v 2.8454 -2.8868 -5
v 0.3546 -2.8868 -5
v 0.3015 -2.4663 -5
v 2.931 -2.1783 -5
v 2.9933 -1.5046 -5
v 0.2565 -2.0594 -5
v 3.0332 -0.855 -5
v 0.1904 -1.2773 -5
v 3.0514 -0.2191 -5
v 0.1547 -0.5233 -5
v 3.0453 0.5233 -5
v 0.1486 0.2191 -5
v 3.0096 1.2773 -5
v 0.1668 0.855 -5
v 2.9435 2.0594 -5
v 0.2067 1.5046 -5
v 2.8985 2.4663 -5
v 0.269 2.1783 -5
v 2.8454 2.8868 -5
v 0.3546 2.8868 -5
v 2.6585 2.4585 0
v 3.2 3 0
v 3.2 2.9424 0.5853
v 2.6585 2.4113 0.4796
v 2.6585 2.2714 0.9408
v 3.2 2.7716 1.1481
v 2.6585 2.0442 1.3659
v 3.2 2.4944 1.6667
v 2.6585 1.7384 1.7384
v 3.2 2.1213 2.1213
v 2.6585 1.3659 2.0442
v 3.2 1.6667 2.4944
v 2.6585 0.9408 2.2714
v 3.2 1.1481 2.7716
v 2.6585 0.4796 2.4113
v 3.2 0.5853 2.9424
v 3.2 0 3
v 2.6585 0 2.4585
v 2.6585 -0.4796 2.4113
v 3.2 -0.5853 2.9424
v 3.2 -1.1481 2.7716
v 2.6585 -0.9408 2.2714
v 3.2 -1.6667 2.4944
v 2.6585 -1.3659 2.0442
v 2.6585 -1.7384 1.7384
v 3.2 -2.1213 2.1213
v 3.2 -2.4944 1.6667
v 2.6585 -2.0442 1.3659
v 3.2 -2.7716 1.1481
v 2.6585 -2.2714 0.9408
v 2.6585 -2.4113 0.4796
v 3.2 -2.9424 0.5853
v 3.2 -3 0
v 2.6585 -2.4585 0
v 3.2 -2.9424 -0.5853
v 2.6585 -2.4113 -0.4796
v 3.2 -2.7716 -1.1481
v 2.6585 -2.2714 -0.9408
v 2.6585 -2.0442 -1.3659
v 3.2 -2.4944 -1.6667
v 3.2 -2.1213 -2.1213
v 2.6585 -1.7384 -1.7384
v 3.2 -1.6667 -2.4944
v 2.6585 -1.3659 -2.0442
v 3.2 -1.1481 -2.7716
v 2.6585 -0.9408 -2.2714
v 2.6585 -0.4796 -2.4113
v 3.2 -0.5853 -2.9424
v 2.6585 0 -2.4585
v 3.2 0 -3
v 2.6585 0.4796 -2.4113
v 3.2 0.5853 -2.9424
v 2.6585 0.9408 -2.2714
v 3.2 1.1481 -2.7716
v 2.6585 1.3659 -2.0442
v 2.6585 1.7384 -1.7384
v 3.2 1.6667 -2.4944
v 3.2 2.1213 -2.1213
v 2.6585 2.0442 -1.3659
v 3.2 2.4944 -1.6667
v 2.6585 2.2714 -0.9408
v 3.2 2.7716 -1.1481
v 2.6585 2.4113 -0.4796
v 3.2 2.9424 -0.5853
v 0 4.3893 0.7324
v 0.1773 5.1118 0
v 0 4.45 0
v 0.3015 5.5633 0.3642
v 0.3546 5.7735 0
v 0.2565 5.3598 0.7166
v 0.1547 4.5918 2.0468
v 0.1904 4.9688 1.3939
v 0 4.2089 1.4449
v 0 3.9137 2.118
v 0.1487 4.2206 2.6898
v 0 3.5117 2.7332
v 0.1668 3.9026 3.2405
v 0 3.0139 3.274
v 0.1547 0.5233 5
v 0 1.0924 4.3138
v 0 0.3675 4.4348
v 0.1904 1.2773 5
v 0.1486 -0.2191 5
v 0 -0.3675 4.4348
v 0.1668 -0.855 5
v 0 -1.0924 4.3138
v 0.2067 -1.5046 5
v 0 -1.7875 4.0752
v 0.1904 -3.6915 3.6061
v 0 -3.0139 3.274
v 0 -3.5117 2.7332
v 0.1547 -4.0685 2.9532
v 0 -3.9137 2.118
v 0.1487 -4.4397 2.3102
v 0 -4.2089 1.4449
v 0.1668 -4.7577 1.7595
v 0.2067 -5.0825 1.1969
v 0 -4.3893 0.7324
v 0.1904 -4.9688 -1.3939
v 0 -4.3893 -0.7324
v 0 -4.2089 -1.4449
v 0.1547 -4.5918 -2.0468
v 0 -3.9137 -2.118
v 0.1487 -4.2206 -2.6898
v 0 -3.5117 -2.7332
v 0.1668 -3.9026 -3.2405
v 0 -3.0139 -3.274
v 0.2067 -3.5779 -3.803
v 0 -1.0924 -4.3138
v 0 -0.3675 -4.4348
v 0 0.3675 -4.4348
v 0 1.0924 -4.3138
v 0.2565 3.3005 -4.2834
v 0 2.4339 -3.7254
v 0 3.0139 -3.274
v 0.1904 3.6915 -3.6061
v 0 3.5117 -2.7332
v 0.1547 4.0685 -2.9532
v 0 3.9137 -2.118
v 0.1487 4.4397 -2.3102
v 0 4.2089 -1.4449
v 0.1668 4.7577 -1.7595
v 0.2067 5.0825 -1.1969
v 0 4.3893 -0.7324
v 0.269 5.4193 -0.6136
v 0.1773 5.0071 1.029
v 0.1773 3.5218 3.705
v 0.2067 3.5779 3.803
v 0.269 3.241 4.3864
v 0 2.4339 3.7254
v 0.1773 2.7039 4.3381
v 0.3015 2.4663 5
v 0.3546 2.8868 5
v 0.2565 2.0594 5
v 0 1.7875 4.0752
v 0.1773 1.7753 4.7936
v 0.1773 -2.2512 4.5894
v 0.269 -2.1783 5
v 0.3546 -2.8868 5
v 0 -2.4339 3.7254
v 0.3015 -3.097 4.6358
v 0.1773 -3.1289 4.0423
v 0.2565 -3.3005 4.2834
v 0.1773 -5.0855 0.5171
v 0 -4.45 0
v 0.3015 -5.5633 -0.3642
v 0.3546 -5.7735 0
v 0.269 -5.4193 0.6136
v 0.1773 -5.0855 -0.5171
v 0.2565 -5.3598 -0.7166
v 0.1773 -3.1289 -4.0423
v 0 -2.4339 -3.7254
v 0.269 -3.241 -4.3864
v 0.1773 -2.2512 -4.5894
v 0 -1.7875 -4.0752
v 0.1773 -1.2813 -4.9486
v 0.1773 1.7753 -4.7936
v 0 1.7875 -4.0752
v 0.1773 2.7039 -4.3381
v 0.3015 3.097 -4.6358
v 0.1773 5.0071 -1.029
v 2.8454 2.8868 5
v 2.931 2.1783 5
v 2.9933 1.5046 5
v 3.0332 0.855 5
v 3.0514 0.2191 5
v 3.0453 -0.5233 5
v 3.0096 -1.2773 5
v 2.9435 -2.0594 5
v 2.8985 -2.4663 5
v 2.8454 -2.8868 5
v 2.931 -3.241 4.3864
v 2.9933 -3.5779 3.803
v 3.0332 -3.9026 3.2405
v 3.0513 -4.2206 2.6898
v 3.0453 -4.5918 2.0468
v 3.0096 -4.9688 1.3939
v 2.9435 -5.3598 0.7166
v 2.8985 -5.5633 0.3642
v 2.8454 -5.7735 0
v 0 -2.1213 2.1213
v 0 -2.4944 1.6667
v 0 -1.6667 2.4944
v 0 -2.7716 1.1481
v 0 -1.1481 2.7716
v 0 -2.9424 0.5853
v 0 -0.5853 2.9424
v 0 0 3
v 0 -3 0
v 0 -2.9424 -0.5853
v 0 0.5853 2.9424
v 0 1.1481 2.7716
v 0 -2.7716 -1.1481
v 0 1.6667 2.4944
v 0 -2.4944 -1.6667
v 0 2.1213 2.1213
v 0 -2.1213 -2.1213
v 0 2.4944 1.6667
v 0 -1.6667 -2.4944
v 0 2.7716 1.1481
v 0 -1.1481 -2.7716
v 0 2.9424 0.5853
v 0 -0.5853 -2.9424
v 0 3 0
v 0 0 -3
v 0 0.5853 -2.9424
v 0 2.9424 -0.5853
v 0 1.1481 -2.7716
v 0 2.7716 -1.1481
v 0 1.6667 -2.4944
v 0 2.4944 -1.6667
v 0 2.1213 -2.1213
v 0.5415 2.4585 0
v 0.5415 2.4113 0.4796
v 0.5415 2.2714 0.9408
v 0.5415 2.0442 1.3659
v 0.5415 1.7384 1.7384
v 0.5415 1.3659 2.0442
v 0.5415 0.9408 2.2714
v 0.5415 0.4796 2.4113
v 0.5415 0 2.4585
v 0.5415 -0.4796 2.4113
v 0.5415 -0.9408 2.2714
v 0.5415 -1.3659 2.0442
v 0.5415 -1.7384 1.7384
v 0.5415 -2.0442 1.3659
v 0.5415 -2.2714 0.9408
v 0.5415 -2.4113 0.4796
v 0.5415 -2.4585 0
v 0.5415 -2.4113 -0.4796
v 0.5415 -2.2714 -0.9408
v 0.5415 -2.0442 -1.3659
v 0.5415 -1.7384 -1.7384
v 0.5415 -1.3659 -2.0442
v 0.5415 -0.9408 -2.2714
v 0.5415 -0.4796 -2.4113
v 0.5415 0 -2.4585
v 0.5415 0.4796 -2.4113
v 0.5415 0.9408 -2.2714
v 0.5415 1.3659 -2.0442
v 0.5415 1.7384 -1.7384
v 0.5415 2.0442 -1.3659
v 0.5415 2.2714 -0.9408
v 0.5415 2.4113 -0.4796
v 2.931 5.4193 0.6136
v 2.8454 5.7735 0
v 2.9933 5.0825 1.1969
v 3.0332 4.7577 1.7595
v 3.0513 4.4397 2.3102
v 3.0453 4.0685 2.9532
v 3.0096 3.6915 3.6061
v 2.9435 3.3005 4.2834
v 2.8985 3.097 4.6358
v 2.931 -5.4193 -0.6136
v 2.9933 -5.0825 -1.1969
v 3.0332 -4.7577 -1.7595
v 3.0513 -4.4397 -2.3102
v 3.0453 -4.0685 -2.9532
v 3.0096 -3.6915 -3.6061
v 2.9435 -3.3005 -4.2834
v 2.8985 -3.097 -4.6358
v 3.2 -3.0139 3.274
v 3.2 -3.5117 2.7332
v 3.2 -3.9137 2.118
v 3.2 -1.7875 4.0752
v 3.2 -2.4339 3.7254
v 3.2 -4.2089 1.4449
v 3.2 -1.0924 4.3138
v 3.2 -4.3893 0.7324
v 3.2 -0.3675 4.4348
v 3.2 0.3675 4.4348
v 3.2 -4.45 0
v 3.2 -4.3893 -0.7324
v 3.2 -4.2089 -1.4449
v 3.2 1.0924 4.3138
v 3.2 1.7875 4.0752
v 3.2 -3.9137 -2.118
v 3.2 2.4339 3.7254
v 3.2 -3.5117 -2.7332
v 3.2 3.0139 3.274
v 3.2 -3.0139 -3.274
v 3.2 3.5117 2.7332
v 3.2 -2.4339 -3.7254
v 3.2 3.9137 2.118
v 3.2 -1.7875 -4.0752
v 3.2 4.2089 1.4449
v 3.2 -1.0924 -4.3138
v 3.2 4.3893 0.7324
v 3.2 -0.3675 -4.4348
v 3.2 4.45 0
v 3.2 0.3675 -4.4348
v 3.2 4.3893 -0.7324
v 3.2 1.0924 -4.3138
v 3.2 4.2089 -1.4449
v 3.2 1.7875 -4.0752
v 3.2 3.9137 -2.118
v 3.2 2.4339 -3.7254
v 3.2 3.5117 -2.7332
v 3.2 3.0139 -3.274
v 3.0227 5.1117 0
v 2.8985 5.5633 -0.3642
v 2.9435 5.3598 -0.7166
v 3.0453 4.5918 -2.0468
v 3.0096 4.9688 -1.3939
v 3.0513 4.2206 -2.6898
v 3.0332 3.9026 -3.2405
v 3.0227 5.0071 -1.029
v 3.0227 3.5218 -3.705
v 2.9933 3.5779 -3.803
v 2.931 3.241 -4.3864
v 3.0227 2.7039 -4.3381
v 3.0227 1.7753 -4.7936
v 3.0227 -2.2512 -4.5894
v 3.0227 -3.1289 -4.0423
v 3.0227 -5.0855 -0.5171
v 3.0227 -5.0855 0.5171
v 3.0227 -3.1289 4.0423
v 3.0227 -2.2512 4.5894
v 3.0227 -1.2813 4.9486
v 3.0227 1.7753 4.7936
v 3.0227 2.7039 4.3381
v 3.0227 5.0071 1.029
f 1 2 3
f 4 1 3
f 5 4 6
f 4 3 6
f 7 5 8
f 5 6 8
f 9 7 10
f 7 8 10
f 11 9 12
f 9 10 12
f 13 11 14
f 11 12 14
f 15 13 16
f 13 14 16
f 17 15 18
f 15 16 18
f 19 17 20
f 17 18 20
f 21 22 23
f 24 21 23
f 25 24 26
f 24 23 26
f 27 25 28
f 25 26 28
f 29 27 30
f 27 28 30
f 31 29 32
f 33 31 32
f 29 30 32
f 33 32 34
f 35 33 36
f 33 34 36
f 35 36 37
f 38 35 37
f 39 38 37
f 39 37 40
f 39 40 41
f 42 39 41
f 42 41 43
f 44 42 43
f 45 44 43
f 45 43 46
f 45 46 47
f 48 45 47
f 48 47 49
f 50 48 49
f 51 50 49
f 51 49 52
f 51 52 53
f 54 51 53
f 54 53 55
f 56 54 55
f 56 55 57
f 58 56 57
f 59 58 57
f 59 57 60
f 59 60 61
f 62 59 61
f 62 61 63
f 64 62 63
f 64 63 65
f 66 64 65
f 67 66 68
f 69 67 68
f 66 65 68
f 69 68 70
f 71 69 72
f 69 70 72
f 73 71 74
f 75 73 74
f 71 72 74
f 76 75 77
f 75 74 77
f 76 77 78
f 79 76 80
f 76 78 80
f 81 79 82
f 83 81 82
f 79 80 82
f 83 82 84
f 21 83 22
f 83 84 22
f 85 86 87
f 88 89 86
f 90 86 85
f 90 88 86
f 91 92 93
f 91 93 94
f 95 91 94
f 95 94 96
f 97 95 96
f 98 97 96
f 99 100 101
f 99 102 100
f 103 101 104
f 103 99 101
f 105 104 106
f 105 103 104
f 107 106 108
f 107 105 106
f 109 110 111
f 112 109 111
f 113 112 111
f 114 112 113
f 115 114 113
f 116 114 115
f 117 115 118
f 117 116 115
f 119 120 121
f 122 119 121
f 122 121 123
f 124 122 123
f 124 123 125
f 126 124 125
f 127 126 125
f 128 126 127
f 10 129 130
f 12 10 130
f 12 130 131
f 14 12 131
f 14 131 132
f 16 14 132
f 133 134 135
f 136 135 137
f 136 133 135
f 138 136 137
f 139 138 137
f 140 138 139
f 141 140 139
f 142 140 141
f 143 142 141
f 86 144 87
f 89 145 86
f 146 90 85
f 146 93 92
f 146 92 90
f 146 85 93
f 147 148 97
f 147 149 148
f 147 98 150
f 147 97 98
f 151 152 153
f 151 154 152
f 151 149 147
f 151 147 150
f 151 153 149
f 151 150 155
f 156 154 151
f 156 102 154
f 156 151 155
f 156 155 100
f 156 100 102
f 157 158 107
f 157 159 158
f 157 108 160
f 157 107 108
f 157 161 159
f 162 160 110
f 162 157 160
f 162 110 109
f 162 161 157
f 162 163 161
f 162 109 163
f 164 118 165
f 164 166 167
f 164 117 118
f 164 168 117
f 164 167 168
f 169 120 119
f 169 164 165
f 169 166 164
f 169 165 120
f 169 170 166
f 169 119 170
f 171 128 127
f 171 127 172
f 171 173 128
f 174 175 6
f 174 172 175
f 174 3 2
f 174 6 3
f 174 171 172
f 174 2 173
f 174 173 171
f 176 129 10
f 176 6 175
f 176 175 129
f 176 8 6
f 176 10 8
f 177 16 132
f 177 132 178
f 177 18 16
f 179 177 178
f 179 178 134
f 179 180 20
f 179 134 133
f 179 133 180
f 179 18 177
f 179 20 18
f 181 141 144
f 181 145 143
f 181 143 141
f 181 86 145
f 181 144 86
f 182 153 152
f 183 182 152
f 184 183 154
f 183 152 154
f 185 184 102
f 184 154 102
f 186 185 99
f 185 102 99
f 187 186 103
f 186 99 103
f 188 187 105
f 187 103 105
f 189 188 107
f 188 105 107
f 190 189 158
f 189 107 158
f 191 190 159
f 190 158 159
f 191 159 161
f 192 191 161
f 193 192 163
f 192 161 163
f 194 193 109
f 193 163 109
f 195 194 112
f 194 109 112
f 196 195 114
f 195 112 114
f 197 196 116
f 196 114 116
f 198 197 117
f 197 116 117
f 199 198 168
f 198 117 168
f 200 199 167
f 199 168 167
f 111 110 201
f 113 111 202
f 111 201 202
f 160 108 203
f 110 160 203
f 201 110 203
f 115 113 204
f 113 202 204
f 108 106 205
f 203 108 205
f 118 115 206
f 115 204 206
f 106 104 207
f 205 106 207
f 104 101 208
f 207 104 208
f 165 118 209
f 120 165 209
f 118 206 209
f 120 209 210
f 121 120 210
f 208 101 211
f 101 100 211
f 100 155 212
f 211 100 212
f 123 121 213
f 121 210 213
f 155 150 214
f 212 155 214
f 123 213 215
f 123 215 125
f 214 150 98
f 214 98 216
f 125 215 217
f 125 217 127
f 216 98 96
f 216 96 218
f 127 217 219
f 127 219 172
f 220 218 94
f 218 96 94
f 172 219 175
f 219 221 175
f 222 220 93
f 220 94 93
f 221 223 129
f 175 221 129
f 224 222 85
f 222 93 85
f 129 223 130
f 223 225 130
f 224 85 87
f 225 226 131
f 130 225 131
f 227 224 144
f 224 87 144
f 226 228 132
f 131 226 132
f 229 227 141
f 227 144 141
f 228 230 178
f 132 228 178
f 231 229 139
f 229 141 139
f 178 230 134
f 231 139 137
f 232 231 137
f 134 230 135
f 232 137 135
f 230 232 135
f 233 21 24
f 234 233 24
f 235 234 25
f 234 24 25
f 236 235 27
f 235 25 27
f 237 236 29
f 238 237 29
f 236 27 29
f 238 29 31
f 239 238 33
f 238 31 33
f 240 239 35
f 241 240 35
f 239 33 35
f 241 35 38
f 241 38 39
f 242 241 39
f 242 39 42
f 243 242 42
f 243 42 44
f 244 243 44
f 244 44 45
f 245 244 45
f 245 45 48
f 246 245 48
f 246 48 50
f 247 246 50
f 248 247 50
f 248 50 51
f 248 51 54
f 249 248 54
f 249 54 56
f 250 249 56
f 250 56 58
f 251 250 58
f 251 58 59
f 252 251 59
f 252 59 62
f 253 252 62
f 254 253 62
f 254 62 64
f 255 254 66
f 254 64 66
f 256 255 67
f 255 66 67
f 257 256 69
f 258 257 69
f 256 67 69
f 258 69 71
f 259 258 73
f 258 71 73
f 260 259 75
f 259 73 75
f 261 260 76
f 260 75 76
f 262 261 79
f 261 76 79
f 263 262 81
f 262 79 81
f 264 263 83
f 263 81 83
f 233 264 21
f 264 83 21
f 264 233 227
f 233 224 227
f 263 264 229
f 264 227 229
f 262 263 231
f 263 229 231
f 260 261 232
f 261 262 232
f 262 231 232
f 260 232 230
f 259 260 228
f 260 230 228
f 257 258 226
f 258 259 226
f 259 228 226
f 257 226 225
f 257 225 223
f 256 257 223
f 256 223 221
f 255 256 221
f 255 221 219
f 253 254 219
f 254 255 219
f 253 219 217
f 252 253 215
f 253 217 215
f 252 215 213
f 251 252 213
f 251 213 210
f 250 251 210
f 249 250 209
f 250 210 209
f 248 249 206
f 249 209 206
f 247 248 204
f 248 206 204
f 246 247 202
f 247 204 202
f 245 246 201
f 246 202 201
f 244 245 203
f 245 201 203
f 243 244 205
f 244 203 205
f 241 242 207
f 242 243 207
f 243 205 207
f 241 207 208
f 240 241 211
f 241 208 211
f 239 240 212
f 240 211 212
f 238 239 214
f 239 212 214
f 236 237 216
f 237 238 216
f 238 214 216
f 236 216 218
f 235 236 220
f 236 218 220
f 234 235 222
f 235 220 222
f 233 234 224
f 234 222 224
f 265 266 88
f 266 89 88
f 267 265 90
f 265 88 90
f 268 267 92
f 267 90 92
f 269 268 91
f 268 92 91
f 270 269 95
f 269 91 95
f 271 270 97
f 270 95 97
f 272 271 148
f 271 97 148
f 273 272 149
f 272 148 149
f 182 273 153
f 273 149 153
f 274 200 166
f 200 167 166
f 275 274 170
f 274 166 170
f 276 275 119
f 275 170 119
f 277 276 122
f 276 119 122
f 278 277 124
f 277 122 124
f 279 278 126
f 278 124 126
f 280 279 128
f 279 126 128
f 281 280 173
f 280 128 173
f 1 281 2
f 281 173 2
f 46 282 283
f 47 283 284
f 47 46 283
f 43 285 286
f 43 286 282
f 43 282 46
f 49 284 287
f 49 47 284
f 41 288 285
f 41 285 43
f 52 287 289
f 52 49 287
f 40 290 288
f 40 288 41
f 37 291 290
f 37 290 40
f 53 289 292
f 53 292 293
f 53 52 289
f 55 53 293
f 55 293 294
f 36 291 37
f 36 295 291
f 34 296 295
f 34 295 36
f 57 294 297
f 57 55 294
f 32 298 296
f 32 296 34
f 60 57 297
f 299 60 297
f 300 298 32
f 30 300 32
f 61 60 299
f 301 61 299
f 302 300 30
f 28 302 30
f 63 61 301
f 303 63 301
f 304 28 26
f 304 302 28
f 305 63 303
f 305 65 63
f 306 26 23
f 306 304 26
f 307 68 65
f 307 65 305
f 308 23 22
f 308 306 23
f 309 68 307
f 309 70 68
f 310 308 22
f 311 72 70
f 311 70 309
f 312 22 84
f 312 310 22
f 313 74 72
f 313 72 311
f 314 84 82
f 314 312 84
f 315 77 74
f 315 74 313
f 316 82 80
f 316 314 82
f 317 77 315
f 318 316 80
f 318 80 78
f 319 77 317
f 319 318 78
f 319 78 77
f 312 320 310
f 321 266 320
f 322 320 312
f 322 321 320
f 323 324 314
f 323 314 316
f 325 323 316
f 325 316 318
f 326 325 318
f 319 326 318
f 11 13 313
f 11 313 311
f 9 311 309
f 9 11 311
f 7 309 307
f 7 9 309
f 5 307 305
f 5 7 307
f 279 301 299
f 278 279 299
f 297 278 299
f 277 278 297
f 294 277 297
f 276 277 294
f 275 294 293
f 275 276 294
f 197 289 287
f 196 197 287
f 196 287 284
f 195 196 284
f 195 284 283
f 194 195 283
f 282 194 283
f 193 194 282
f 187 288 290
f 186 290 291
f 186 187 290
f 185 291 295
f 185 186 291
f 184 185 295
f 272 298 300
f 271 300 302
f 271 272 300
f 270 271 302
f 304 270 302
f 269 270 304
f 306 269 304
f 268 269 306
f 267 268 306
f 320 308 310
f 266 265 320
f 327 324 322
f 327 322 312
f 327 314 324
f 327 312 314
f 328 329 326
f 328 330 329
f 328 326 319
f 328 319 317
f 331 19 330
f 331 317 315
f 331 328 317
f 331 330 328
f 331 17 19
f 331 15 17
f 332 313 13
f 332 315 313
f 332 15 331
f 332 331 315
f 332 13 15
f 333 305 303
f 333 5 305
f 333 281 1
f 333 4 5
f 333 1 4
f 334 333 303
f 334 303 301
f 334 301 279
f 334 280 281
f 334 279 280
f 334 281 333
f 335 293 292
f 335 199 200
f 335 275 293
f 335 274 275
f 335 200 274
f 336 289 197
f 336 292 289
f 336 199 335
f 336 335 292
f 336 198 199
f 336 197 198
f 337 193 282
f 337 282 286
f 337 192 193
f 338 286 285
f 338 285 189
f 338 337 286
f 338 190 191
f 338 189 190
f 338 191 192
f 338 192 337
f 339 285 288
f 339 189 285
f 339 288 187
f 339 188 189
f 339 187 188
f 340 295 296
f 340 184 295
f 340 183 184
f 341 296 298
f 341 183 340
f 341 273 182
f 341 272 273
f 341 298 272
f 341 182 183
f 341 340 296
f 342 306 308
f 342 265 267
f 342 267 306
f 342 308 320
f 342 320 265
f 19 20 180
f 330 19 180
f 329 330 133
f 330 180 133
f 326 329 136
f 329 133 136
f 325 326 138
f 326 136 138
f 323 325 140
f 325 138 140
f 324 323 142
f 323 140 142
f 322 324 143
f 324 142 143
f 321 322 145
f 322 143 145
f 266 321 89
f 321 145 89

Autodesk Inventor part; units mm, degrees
sketch "Sketch_1" plane through (0, 0, 0) normal (0, 1, 0) x (-1, 0, 0)
  line L0 (-3.2, 0) -> (0, 0)
  line L1 (0, 0) -> (0, -6)
  line L2 (0, -6) -> (-3.2, -6)
  line L3 (-3.2, -6) -> (-3.2, 0)
  line L4 (-3.2, 0) -> (0, 0)
revolve "Revolution1" add sketch "Sketch_1" angle 360 about axis through (3.2, 0, 0) along (1, 0, 0)
sketch "Sketch_3" plane through (0, 0, 0) normal (0, 0, 1) x (1, 0, 0)
  line L0 (3.2, 0) -> (0, 0)
  line L1 (-4.45, 10) -> (-4.45, 4.45)
  line L2 (-4.45, 4.45) -> (0, 4.45)
  line L3 (0, 4.45) -> (0.4153, 6)
  line L4 (0.4153, 6) -> (2.7847, 6)
  line L5 (2.7847, 6) -> (3.2, 4.45)
  line L6 (3.2, 4.45) -> (7.65, 4.45)
  line L7 (7.65, 4.45) -> (7.65, 10)
  line L8 (7.65, 10) -> (-4.45, 10)
revolve "Revolution2" cut sketch "Sketch_3" angle 360 about axis through (3.2, 0, 0) along (1, 0, 0)
sketch "Skizze_3" plane through (0, 0, 0) normal (0, 0, 1) x (1, 0, 0)
  line L0 (3.2, 0) -> (0, 0)
  line L1 (0, 0) -> (0, 3)
  line L2 (0, 3) -> (0.5415, 2.4585)
  line L3 (0.5415, 2.4585) -> (2.6585, 2.4585)
  line L4 (2.6585, 2.4585) -> (3.2, 3)
  line L5 (3.2, 3) -> (3.2, 0)
  line L6 (3.2, 0) -> (0, 0)
revolve "Revolution3" cut sketch "Skizze_3" angle 360 about axis through (3.2, 0, 0) along (1, 0, 0)
thread "Thread1" size "M6x1" class "6H" standard "ISO Metric profile" full length
sketch "Sketch_2" plane through (0, 0, 0) normal (1, 0, 0) x (0, 1, 0)
  line L0 (20, 20) -> (-20, 20)
  line L1 (-20, 20) -> (-20, -20)
  line L2 (-20, -20) -> (20, -20)
  line L3 (20, -20) -> (20, 20)
  line L4 (2.8868, 5) -> (-2.8868, 5)
  line L5 (-2.8868, 5) -> (-5.7735, 0)
  line L6 (-5.7735, 0) -> (-2.8868, -5)
  line L7 (-2.8868, -5) -> (2.8868, -5)
  line L8 (2.8868, -5) -> (5.7735, 0)
  line L9 (5.7735, 0) -> (2.8868, 5)
extrude "Extrusion1" cut sketch "Sketch_2" along normal mid plane 8.4
ref_plane "2CYL_XY" through (1.6, 0, 0) normal (1, 0, 0) x (0, 0, -1)
ref_plane "2CYL_YZ" through (1.6, 0, 0) normal (0, 0, -1) x (0, 1, 0)
ref_plane "2CYL_ZX" through (1.6, 0, 0) normal (0, 1, 0) x (1, 0, 0)
ref_plane "IP1_XY" through (0, 0, 0) normal (1, 0, 0) x (0, 0, -1)
ref_plane "IP1_YZ" through (0, 0, 0) normal (0, 0, -1) x (0, 1, 0)
ref_plane "IP1_ZX" through (0, 0, 0) normal (0, 1, 0) x (1, 0, 0)
ref_plane "IP2_XY" through (3.2, 0, 0) normal (1, 0, 0) x (0, 0, -1)
ref_plane "IP2_YZ" through (3.2, 0, 0) normal (0, 0, -1) x (0, 1, 0)
ref_plane "IP2_ZX" through (3.2, 0, 0) normal (0, 1, 0) x (1, 0, 0)
properties part number "ISO 4035 M6(F)"
